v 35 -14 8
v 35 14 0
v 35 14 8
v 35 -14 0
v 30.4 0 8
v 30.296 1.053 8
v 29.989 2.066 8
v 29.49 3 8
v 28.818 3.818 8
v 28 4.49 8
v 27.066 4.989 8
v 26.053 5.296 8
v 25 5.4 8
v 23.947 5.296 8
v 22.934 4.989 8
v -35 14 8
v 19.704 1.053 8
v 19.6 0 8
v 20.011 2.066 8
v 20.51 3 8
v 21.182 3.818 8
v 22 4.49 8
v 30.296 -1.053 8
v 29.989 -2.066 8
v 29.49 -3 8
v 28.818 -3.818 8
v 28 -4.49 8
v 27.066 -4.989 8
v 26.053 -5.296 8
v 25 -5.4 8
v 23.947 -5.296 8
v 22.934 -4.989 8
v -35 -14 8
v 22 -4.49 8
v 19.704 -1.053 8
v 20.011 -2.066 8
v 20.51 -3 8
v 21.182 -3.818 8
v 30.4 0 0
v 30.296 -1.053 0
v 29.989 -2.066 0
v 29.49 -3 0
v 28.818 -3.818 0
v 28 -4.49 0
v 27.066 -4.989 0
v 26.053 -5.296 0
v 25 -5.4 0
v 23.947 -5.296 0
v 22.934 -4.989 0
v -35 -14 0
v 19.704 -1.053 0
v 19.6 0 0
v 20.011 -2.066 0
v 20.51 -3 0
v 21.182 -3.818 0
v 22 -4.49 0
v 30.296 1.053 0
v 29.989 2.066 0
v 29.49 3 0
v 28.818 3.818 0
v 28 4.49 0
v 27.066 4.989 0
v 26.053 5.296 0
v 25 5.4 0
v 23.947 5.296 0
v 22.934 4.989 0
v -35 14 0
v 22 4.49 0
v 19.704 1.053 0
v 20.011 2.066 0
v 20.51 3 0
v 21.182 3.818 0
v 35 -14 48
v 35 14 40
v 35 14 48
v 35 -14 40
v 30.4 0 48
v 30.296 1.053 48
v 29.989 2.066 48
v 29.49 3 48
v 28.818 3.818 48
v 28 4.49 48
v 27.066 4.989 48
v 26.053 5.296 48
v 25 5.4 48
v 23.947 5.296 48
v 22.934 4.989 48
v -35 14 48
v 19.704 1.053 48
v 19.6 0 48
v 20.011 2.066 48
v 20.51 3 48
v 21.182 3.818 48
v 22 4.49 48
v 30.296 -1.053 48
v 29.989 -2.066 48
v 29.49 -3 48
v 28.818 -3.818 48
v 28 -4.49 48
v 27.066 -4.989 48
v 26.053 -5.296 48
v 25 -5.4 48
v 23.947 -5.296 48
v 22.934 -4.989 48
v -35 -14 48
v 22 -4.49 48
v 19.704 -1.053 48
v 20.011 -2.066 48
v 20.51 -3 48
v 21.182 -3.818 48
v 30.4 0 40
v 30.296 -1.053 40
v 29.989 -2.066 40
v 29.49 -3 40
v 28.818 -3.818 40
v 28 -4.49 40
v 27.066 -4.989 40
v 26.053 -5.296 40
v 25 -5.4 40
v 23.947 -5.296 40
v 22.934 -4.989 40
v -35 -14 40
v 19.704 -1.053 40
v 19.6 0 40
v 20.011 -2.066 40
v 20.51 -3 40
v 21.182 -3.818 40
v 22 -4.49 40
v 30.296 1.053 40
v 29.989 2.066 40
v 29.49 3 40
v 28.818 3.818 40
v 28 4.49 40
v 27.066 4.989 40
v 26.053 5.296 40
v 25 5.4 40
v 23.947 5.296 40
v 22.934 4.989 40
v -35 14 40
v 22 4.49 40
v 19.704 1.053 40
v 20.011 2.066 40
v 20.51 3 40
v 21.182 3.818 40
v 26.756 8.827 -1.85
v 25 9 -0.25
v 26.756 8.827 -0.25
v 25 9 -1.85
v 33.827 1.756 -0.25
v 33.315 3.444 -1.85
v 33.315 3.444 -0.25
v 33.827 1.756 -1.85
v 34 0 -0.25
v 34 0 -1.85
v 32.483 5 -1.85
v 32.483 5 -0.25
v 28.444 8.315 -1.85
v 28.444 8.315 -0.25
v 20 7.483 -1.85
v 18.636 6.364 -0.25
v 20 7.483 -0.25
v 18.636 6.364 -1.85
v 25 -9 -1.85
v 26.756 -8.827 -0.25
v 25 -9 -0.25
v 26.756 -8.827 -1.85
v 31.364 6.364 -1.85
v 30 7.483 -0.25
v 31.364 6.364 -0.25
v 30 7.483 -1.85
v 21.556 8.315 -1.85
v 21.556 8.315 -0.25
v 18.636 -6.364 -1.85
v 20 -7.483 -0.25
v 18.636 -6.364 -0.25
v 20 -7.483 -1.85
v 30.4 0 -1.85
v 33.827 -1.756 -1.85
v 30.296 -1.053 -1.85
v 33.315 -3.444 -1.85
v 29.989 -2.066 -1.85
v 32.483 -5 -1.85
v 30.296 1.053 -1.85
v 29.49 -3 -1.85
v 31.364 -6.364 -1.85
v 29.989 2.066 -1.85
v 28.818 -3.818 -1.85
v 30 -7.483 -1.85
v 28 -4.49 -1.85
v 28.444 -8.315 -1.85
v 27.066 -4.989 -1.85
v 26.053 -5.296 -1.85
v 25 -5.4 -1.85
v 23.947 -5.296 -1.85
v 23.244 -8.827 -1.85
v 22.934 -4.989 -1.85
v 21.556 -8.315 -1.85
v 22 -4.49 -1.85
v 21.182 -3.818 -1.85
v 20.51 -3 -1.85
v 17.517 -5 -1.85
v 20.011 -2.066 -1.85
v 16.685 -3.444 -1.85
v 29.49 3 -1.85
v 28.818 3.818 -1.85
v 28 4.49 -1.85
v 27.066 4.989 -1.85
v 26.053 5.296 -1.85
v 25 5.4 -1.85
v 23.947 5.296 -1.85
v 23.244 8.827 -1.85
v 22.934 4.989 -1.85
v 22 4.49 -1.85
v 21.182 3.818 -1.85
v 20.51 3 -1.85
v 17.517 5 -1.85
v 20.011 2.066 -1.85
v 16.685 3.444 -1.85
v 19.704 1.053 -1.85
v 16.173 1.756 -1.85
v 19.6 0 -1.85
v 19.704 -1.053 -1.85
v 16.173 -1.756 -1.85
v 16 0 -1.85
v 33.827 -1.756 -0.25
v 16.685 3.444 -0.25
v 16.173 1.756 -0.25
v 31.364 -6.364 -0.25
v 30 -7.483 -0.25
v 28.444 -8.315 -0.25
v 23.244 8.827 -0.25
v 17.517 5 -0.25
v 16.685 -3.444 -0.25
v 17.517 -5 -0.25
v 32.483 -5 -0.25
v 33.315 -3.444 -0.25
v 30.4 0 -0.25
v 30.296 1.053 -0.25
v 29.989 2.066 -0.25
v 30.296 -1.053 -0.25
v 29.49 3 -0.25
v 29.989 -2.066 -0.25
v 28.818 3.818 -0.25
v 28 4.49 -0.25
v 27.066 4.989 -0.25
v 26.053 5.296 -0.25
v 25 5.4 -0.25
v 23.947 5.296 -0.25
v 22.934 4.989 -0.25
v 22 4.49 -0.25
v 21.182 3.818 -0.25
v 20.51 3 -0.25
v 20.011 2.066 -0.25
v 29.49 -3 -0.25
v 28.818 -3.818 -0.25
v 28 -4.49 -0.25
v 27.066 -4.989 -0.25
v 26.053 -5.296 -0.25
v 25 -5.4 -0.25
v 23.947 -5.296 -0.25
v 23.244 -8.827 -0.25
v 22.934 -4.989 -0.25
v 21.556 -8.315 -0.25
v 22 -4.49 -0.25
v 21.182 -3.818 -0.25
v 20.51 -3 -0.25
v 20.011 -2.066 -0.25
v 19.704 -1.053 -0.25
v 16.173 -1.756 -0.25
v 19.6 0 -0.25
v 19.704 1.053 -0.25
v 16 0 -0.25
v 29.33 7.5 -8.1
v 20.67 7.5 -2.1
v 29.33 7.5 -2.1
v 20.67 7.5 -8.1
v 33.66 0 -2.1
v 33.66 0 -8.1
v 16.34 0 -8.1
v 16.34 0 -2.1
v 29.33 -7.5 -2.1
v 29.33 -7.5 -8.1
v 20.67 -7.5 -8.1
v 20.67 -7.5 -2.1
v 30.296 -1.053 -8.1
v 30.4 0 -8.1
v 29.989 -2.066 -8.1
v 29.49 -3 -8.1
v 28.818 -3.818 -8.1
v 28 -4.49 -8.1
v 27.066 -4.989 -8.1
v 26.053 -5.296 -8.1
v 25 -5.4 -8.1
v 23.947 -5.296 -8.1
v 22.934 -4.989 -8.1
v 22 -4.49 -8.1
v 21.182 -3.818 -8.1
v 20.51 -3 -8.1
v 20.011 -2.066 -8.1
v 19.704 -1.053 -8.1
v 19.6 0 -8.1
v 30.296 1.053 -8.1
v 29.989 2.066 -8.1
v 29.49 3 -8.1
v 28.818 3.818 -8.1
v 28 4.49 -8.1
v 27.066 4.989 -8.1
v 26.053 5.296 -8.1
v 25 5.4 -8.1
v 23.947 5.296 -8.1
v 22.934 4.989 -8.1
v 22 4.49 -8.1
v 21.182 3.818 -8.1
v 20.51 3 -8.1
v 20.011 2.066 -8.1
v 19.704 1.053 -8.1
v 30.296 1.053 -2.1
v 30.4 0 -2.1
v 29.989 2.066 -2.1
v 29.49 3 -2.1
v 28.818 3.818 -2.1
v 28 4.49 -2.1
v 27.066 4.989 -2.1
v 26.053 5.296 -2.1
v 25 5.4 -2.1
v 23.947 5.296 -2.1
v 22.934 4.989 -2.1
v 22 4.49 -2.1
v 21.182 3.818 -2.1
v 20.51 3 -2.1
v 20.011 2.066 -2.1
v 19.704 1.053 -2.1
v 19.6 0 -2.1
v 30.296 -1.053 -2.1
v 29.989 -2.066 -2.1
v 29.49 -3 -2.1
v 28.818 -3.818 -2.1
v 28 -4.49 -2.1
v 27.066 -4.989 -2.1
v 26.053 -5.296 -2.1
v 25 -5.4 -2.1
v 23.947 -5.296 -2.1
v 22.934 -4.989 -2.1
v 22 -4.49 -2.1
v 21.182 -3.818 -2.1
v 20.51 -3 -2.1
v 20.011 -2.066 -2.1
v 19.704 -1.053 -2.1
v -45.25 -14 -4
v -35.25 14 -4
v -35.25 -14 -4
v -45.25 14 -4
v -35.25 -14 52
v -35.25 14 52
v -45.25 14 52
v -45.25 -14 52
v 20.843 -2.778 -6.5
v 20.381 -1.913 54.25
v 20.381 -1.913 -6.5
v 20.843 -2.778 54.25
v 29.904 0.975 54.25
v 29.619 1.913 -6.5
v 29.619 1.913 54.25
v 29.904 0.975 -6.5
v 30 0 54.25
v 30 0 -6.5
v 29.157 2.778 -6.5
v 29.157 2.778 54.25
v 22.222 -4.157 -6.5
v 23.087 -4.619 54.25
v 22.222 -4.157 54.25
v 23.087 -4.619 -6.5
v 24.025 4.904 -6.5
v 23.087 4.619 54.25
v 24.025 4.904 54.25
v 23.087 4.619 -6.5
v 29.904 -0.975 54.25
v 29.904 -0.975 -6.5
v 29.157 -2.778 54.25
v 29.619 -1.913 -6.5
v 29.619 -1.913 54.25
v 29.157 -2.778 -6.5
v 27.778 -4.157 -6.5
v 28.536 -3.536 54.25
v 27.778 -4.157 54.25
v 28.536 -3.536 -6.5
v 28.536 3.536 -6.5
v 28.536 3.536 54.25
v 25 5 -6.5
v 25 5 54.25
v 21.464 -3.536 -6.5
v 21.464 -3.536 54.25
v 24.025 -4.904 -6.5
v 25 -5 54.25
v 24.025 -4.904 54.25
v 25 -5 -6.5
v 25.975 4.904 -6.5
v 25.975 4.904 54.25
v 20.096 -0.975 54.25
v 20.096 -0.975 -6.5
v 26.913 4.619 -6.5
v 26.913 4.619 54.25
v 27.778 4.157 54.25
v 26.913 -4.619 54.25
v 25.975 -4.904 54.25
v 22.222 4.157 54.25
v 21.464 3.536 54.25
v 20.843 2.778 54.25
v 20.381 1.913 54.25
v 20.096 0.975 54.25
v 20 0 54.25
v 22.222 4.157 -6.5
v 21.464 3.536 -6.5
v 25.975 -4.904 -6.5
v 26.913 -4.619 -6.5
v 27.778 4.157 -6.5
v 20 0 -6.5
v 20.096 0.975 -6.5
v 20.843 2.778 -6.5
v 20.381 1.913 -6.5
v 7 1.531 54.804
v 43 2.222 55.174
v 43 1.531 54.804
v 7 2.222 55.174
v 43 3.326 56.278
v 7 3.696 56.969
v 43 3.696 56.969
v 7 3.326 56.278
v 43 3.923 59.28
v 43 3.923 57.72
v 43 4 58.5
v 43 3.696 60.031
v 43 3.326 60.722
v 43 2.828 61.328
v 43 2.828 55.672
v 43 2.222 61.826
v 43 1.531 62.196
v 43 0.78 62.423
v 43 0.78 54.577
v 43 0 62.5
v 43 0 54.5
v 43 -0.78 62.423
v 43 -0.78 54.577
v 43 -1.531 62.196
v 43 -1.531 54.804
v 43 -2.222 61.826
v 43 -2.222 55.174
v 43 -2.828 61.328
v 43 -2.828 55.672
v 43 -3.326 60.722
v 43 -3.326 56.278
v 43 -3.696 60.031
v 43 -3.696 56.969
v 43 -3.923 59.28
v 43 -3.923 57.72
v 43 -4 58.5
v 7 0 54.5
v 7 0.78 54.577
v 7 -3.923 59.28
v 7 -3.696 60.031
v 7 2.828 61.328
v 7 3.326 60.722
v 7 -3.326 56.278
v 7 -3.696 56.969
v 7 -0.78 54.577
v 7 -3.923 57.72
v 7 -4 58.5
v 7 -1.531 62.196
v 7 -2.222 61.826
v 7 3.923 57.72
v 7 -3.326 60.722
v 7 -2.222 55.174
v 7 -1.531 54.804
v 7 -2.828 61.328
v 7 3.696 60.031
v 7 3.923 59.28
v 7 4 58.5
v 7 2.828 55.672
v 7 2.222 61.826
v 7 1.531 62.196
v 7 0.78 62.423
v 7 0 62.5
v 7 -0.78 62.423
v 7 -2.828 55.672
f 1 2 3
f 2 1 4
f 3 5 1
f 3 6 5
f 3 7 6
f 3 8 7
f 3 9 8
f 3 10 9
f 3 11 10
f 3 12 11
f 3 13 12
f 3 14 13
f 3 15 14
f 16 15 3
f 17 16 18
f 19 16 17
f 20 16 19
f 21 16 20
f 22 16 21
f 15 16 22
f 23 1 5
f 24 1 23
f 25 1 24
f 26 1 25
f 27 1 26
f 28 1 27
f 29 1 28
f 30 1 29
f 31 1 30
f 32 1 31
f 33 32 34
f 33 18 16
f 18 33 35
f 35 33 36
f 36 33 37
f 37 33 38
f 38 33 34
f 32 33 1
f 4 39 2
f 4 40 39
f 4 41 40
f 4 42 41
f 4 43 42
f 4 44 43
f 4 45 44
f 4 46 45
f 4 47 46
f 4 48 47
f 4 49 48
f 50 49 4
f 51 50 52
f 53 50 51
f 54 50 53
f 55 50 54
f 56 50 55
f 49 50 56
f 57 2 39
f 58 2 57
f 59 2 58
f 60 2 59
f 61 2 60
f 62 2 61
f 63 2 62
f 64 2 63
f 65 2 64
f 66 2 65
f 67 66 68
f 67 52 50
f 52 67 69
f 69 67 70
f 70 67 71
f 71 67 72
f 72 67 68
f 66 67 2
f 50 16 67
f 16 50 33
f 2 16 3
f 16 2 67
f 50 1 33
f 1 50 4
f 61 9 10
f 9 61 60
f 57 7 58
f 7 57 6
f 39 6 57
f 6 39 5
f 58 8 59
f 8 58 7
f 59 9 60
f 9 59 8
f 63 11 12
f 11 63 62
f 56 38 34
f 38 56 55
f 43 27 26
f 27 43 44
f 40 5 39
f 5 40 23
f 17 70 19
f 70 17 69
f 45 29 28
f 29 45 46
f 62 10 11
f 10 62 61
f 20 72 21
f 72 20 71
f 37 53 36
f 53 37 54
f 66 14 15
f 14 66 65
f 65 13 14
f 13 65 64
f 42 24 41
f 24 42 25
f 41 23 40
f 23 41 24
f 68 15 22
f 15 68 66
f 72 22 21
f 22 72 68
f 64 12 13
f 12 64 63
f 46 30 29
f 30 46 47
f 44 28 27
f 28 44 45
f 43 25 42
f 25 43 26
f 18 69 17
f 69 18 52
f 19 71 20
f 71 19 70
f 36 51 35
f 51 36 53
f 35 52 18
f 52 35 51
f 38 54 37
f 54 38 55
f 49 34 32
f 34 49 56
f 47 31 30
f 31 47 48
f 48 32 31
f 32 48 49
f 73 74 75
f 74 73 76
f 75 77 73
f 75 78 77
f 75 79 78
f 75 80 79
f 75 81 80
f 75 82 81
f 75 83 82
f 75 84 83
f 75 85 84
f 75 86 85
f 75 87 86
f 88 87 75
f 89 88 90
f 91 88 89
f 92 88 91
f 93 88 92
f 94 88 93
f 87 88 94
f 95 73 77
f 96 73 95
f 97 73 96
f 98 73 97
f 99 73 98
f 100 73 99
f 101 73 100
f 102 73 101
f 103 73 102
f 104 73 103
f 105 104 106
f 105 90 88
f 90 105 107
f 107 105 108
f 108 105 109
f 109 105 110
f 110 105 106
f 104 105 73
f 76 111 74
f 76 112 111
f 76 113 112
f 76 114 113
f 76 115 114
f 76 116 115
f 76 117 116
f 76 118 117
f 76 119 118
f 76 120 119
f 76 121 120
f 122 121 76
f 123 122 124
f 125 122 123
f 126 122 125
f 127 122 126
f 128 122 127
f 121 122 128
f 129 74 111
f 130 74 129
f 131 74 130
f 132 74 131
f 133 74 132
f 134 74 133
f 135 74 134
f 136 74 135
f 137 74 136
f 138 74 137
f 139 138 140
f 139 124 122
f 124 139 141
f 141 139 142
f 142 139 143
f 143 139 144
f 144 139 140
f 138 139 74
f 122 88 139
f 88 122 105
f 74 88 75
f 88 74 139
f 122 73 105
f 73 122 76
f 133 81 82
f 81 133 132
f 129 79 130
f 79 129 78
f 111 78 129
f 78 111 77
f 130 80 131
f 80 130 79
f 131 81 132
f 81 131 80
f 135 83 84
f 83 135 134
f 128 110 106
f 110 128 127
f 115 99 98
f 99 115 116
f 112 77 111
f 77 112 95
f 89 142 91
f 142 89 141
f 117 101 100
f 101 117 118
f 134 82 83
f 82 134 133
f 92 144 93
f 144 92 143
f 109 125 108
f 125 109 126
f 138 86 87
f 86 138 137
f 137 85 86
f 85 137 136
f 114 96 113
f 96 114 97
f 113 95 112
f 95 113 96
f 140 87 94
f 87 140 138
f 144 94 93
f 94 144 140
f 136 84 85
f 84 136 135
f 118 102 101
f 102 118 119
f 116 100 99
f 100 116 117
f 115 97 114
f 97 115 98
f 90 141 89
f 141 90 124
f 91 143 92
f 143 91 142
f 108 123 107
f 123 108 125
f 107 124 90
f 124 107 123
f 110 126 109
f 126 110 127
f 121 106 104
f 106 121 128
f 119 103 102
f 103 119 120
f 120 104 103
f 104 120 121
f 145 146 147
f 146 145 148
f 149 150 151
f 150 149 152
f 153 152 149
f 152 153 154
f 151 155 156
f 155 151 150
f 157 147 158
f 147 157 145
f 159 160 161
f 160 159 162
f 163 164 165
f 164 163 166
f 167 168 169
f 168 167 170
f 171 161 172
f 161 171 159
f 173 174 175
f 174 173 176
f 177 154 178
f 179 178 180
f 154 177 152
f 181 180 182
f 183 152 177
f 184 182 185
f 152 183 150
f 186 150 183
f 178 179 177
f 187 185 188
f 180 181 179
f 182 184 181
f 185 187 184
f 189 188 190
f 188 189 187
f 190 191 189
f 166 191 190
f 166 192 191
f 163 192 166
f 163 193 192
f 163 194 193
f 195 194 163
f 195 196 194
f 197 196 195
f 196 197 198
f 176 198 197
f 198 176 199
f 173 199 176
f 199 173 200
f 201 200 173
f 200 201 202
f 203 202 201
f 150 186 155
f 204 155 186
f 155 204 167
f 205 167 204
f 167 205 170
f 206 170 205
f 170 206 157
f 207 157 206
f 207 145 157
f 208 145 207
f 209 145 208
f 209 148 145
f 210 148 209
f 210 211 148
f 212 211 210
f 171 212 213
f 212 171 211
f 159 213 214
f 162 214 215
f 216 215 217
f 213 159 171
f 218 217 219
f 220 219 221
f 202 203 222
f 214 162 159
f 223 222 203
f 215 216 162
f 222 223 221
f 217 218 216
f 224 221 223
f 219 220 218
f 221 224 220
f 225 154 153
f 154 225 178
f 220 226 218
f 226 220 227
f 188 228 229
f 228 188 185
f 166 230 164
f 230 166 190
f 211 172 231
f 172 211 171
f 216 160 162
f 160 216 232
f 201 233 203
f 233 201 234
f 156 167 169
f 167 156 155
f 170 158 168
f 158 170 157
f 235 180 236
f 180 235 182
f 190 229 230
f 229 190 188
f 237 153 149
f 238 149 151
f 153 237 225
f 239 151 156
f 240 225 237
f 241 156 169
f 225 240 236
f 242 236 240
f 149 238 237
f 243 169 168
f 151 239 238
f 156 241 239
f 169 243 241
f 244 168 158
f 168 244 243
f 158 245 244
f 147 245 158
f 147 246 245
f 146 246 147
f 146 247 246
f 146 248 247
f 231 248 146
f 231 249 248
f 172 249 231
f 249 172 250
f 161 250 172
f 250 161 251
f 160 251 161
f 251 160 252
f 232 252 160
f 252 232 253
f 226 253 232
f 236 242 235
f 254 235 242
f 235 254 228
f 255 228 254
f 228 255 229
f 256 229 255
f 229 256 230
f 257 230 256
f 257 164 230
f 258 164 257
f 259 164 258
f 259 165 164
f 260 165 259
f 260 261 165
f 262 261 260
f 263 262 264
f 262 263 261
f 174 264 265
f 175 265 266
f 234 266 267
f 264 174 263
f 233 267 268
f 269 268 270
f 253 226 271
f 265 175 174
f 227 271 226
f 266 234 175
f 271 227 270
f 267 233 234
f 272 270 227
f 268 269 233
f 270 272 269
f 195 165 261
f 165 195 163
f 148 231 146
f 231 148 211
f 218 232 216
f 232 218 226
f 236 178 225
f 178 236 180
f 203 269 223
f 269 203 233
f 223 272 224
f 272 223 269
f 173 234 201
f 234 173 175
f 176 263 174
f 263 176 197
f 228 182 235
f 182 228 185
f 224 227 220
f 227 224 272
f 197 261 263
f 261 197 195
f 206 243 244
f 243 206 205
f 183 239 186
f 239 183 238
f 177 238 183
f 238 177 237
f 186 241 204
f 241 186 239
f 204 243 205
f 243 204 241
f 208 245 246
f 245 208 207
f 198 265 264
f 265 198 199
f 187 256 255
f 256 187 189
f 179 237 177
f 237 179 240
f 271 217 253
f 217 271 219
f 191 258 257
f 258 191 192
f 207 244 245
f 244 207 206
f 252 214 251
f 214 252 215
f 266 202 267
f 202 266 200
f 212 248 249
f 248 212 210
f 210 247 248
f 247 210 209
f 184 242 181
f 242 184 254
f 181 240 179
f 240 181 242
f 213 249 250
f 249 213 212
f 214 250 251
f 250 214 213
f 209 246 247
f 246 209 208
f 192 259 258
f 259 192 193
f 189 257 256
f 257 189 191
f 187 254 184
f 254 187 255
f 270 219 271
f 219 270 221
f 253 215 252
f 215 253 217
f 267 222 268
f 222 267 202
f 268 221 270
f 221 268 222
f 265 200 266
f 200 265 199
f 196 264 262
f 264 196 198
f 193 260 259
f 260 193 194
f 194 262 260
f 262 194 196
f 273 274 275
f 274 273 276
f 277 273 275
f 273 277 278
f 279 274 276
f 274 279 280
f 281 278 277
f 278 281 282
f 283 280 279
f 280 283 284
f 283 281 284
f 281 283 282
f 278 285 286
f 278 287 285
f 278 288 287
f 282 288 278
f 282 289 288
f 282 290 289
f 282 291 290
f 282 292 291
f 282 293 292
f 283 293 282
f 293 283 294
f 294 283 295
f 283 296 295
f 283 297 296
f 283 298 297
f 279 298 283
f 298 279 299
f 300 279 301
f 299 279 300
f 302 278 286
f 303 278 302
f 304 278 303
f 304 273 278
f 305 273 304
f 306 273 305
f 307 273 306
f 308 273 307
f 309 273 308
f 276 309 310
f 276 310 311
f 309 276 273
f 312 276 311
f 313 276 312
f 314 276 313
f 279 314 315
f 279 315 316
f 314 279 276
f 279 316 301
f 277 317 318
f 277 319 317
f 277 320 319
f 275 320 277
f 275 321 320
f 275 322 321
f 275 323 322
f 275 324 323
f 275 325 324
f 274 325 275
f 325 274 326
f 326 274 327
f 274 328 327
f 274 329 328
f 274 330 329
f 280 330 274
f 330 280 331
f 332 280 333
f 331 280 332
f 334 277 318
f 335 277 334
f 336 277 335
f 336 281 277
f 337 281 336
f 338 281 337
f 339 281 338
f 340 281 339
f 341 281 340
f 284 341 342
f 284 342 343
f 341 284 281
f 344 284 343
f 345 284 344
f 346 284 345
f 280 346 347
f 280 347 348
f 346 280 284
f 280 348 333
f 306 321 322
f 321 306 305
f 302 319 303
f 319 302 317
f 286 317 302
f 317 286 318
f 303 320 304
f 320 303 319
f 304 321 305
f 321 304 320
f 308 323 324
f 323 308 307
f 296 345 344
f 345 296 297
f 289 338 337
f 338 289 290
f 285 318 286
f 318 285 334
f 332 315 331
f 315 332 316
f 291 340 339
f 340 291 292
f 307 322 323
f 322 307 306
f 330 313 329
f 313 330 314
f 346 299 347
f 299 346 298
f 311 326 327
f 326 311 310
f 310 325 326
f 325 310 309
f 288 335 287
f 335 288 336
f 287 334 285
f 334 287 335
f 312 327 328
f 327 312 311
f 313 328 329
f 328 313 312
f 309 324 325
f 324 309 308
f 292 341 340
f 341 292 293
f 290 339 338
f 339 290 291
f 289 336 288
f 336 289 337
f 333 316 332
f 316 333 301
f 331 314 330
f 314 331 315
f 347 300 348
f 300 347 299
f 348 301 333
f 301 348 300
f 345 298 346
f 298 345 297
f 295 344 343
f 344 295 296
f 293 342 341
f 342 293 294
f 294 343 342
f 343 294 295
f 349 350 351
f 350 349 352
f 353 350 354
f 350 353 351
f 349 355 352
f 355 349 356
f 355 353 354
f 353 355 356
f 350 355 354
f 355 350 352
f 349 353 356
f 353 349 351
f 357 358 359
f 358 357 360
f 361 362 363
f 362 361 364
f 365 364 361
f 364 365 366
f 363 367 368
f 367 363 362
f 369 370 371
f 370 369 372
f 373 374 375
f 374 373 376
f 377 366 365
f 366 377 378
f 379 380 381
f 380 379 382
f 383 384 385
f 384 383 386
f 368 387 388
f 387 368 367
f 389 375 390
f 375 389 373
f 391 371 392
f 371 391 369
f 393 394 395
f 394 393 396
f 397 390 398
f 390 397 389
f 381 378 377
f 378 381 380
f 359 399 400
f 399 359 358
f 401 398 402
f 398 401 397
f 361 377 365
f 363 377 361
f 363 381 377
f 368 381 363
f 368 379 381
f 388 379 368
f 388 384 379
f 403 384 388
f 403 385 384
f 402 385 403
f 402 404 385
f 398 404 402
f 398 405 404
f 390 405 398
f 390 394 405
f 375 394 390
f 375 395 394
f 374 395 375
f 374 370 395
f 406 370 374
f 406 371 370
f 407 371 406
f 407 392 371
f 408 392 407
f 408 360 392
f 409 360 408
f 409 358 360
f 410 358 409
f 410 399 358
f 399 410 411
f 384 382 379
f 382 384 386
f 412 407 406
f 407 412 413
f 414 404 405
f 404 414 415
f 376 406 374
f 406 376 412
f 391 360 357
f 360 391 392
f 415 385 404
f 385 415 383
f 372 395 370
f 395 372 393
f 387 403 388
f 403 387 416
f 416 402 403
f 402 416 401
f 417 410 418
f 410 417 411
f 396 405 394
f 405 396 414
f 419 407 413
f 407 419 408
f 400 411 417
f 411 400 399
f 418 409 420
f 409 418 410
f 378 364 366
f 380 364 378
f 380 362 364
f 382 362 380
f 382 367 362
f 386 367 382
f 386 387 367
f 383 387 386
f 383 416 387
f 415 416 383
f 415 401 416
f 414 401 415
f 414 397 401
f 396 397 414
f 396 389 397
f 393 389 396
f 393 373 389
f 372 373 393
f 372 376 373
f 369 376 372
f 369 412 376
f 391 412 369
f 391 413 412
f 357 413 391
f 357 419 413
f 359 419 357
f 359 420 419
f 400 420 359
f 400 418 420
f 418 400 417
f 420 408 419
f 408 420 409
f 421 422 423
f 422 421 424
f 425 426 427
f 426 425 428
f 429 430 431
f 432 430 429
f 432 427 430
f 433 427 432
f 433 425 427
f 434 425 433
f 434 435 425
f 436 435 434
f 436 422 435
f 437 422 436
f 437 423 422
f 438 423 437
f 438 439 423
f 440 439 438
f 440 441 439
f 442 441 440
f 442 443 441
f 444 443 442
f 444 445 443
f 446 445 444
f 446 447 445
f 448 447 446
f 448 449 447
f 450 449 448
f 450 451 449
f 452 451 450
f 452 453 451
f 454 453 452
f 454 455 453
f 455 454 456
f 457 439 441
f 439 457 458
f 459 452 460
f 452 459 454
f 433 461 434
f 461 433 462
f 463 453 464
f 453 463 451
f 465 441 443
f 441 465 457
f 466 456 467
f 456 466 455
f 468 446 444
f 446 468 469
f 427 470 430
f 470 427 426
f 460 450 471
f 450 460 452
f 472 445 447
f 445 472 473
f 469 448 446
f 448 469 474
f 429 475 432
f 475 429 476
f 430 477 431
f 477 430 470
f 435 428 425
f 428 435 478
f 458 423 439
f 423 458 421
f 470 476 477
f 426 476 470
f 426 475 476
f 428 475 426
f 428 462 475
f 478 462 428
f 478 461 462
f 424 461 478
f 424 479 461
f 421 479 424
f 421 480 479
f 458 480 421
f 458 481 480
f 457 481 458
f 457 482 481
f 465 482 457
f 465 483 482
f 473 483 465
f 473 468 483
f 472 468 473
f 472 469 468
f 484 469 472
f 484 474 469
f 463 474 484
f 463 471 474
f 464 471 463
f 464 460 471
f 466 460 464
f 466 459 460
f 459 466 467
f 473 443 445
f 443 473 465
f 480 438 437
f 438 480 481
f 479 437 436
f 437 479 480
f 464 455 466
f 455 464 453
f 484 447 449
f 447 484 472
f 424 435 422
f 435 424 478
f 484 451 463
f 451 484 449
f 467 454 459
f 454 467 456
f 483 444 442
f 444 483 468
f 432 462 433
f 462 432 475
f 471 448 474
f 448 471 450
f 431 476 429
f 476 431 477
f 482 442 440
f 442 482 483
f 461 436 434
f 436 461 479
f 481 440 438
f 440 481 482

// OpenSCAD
$fn = 32;

// ------------------------------------------------------------------------
// C clamp: throat 40 mm, screw d10
// Every part is its own module, assembly() places every instance.
// ------------------------------------------------------------------------

// --- part 1 ---
module clamp_arm() {
  difference() {
    translate([-35, -14, 0]) cube([70, 28, 8]);
    translate([25, 0, -1]) cylinder(h = 10, d = 10.8);
  }
}

// --- part 2 ---
module clamp_spine() {
  difference() {
    translate([-28, -14, 0]) cube([56, 28, 10]);
  }
}

// --- part 3 ---
module clamp_screw() {
  translate([0, 0, -30.375]) cylinder(h = 60.75, d = 10);
}

// --- part 4 ---
module clamp_washer() {
  difference() {
      translate([0, 0, 0]) cylinder(h = 1.6, d = 18);
      translate([0, 0, -1]) cylinder(h = 3.6, d = 10.8);
    }
}

// --- part 5 ---
module clamp_nut() {
  difference() {
    linear_extrude(height = 6) polygon(points = [[8.66, 0], [4.33, 7.5], [-4.33, 7.5], [-8.66, 0], [-4.33, -7.5], [4.33, -7.5]]);
    translate([0, 0, -1]) cylinder(h = 8, d = 10.8);
  }
}

// --- part 6 ---
module tommy_bar() {
  translate([0, 0, -18]) cylinder(h = 36, d = 8);
}

// --- assembly ---
module assembly() {
  color([0.80, 0.24, 0.20]) translate([0, 0, 0]) rotate([0, 0, 0]) clamp_arm();
  color([0.20, 0.45, 0.75]) translate([0, 0, 40]) rotate([0, 0, 0]) clamp_arm();
  color([0.25, 0.62, 0.32]) translate([-45.25, 0, 24]) rotate([0, 90, 0]) clamp_spine();
  color([0.92, 0.70, 0.18]) translate([25, 0, 23.875]) rotate([0, 0, 0]) clamp_screw();
  color([0.58, 0.35, 0.70]) translate([25, 0, -1.85]) rotate([0, 0, 0]) clamp_washer();
  color([0.16, 0.66, 0.66]) translate([25, 0, -8.1]) rotate([0, 0, 0]) clamp_nut();
  color([0.85, 0.48, 0.18]) translate([25, 0, 58.5]) rotate([0, 90, 0]) tommy_bar();
}

assembly();
